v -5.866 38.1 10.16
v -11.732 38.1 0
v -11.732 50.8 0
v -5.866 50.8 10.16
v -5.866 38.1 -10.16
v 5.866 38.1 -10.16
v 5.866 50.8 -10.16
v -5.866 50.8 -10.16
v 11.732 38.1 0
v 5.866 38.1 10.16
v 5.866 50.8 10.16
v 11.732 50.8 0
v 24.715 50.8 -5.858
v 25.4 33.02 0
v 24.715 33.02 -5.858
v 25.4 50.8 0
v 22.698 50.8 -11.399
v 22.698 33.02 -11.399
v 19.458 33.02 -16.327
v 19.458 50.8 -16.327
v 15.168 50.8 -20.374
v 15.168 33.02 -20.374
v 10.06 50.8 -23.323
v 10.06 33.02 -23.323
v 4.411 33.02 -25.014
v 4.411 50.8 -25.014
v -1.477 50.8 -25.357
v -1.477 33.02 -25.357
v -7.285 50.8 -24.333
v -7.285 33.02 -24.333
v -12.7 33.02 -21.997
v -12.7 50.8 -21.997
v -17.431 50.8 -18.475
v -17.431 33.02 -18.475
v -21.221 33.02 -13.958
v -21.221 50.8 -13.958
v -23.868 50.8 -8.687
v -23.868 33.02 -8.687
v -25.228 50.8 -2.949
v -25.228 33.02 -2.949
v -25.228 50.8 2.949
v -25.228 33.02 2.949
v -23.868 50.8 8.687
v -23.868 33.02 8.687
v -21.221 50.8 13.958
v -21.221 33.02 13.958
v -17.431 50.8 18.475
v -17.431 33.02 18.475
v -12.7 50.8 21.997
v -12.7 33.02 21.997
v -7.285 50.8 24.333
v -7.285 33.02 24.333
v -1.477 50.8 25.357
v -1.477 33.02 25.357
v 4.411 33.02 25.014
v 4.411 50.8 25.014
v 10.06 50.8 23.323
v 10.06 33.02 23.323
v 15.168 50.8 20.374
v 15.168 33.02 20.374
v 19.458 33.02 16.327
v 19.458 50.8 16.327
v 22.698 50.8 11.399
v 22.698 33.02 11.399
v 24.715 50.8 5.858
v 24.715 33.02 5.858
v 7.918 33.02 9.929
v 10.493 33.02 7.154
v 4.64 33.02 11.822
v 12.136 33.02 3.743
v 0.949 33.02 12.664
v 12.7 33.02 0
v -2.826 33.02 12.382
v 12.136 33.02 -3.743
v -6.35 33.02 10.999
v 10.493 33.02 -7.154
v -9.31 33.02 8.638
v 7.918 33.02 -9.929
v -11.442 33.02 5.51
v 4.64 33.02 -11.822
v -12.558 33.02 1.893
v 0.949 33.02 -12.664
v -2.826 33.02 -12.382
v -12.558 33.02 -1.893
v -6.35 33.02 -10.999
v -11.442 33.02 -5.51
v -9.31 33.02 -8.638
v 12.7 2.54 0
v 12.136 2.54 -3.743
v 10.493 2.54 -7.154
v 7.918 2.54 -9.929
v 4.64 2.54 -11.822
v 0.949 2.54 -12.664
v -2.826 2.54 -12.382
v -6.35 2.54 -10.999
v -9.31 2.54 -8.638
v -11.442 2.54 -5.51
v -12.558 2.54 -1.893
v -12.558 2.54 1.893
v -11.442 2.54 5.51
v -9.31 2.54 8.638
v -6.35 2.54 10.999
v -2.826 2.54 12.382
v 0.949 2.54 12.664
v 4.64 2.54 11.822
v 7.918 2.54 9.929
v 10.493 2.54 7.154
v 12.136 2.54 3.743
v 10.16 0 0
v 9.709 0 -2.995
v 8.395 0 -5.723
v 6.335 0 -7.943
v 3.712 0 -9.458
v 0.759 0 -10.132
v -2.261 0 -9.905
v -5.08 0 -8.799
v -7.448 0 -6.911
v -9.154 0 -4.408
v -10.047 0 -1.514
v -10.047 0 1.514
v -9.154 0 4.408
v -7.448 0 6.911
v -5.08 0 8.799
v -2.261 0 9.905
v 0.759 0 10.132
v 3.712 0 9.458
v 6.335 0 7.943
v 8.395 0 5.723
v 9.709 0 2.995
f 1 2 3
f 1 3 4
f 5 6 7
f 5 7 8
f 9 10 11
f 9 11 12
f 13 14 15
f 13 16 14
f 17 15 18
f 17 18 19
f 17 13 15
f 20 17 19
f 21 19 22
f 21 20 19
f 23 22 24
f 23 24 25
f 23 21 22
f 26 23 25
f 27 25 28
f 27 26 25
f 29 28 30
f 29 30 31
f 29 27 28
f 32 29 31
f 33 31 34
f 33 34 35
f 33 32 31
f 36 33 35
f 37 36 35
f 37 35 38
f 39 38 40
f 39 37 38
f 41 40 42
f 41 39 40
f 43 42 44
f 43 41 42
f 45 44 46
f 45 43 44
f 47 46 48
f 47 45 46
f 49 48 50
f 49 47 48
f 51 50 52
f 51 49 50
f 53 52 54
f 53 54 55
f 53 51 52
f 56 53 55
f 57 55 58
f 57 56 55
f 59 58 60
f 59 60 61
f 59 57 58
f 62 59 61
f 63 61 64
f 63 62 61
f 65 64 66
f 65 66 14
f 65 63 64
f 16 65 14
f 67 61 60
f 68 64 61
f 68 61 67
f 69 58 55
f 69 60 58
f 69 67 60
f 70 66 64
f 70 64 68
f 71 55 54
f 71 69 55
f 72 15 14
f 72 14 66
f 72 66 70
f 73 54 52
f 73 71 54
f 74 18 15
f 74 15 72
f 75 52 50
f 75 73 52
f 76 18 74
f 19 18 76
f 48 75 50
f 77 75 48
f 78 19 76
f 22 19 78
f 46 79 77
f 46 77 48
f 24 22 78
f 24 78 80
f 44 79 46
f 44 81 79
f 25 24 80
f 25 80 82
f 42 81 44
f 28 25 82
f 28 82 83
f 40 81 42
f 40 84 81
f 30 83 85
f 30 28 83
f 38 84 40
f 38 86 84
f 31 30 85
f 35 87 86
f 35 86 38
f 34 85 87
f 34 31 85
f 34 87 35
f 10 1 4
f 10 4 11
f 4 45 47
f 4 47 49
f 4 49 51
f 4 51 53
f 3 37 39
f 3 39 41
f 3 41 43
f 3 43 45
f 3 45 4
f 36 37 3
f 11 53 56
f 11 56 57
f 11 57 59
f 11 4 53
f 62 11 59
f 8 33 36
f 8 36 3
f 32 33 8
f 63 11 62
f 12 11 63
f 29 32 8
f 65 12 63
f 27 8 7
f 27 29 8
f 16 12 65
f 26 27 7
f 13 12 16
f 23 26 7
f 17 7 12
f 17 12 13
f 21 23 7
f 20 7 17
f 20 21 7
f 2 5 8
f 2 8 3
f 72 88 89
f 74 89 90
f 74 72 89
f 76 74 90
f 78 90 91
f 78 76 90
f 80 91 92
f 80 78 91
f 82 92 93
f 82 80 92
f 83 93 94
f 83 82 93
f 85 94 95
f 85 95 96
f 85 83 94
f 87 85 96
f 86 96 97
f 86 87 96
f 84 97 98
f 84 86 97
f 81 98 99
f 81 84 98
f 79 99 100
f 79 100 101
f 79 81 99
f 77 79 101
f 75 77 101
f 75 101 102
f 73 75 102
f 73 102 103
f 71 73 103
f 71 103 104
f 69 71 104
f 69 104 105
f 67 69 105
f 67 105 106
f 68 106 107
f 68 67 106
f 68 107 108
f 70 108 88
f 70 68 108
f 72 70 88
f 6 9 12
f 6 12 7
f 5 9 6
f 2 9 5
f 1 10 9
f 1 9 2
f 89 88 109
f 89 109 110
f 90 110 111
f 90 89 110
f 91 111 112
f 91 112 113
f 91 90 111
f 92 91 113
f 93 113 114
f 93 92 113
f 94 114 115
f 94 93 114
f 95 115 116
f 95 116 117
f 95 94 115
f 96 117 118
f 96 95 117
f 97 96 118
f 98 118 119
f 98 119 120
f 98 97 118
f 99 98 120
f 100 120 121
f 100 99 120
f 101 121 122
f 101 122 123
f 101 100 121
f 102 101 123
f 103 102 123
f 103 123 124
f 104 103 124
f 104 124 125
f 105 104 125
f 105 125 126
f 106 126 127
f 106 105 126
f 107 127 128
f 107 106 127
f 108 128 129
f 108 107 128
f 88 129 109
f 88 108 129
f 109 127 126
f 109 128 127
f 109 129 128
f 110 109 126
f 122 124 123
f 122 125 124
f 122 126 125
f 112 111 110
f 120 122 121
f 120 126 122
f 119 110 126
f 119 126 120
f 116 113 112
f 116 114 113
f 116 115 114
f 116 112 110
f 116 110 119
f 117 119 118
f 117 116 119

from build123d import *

# Parameters (mm, degrees)
F2_SIZE  = 2.54
F4_DEPTH = 12.7


with BuildPart() as f1:
    # F0 (on Top) → F1 (revolve)
    with BuildSketch(Plane.XY):
        Polygon((0, 50.8), (0, 0), (12.7, 0), (12.7, 33.02), (25.4, 33.02), (25.4, 50.8), align=None)
    revolve(axis=Axis((0, 25.4, 0), (0, 1, 0)))

    # F2
    f2_edges = [f1.edges().sort_by_distance(p)[0] for p in [
        (-12.7, 0, 0),
    ]]
    chamfer(f2_edges, length=F2_SIZE)

    # F3 (on face) → F4 (cut)
    with BuildSketch(Plane(origin=(0, 50.8, 0), x_dir=(-1, 0, 0), z_dir=(0, 1, 0))):
        Polygon((-5.865879, 10.16), (-11.731757, 0), (-5.865879, -10.16), (5.865879, -10.16), (11.731757, 0), (5.865879, 10.16), align=None)
    extrude(amount=-F4_DEPTH, mode=Mode.SUBTRACT)


solid = f1.part
